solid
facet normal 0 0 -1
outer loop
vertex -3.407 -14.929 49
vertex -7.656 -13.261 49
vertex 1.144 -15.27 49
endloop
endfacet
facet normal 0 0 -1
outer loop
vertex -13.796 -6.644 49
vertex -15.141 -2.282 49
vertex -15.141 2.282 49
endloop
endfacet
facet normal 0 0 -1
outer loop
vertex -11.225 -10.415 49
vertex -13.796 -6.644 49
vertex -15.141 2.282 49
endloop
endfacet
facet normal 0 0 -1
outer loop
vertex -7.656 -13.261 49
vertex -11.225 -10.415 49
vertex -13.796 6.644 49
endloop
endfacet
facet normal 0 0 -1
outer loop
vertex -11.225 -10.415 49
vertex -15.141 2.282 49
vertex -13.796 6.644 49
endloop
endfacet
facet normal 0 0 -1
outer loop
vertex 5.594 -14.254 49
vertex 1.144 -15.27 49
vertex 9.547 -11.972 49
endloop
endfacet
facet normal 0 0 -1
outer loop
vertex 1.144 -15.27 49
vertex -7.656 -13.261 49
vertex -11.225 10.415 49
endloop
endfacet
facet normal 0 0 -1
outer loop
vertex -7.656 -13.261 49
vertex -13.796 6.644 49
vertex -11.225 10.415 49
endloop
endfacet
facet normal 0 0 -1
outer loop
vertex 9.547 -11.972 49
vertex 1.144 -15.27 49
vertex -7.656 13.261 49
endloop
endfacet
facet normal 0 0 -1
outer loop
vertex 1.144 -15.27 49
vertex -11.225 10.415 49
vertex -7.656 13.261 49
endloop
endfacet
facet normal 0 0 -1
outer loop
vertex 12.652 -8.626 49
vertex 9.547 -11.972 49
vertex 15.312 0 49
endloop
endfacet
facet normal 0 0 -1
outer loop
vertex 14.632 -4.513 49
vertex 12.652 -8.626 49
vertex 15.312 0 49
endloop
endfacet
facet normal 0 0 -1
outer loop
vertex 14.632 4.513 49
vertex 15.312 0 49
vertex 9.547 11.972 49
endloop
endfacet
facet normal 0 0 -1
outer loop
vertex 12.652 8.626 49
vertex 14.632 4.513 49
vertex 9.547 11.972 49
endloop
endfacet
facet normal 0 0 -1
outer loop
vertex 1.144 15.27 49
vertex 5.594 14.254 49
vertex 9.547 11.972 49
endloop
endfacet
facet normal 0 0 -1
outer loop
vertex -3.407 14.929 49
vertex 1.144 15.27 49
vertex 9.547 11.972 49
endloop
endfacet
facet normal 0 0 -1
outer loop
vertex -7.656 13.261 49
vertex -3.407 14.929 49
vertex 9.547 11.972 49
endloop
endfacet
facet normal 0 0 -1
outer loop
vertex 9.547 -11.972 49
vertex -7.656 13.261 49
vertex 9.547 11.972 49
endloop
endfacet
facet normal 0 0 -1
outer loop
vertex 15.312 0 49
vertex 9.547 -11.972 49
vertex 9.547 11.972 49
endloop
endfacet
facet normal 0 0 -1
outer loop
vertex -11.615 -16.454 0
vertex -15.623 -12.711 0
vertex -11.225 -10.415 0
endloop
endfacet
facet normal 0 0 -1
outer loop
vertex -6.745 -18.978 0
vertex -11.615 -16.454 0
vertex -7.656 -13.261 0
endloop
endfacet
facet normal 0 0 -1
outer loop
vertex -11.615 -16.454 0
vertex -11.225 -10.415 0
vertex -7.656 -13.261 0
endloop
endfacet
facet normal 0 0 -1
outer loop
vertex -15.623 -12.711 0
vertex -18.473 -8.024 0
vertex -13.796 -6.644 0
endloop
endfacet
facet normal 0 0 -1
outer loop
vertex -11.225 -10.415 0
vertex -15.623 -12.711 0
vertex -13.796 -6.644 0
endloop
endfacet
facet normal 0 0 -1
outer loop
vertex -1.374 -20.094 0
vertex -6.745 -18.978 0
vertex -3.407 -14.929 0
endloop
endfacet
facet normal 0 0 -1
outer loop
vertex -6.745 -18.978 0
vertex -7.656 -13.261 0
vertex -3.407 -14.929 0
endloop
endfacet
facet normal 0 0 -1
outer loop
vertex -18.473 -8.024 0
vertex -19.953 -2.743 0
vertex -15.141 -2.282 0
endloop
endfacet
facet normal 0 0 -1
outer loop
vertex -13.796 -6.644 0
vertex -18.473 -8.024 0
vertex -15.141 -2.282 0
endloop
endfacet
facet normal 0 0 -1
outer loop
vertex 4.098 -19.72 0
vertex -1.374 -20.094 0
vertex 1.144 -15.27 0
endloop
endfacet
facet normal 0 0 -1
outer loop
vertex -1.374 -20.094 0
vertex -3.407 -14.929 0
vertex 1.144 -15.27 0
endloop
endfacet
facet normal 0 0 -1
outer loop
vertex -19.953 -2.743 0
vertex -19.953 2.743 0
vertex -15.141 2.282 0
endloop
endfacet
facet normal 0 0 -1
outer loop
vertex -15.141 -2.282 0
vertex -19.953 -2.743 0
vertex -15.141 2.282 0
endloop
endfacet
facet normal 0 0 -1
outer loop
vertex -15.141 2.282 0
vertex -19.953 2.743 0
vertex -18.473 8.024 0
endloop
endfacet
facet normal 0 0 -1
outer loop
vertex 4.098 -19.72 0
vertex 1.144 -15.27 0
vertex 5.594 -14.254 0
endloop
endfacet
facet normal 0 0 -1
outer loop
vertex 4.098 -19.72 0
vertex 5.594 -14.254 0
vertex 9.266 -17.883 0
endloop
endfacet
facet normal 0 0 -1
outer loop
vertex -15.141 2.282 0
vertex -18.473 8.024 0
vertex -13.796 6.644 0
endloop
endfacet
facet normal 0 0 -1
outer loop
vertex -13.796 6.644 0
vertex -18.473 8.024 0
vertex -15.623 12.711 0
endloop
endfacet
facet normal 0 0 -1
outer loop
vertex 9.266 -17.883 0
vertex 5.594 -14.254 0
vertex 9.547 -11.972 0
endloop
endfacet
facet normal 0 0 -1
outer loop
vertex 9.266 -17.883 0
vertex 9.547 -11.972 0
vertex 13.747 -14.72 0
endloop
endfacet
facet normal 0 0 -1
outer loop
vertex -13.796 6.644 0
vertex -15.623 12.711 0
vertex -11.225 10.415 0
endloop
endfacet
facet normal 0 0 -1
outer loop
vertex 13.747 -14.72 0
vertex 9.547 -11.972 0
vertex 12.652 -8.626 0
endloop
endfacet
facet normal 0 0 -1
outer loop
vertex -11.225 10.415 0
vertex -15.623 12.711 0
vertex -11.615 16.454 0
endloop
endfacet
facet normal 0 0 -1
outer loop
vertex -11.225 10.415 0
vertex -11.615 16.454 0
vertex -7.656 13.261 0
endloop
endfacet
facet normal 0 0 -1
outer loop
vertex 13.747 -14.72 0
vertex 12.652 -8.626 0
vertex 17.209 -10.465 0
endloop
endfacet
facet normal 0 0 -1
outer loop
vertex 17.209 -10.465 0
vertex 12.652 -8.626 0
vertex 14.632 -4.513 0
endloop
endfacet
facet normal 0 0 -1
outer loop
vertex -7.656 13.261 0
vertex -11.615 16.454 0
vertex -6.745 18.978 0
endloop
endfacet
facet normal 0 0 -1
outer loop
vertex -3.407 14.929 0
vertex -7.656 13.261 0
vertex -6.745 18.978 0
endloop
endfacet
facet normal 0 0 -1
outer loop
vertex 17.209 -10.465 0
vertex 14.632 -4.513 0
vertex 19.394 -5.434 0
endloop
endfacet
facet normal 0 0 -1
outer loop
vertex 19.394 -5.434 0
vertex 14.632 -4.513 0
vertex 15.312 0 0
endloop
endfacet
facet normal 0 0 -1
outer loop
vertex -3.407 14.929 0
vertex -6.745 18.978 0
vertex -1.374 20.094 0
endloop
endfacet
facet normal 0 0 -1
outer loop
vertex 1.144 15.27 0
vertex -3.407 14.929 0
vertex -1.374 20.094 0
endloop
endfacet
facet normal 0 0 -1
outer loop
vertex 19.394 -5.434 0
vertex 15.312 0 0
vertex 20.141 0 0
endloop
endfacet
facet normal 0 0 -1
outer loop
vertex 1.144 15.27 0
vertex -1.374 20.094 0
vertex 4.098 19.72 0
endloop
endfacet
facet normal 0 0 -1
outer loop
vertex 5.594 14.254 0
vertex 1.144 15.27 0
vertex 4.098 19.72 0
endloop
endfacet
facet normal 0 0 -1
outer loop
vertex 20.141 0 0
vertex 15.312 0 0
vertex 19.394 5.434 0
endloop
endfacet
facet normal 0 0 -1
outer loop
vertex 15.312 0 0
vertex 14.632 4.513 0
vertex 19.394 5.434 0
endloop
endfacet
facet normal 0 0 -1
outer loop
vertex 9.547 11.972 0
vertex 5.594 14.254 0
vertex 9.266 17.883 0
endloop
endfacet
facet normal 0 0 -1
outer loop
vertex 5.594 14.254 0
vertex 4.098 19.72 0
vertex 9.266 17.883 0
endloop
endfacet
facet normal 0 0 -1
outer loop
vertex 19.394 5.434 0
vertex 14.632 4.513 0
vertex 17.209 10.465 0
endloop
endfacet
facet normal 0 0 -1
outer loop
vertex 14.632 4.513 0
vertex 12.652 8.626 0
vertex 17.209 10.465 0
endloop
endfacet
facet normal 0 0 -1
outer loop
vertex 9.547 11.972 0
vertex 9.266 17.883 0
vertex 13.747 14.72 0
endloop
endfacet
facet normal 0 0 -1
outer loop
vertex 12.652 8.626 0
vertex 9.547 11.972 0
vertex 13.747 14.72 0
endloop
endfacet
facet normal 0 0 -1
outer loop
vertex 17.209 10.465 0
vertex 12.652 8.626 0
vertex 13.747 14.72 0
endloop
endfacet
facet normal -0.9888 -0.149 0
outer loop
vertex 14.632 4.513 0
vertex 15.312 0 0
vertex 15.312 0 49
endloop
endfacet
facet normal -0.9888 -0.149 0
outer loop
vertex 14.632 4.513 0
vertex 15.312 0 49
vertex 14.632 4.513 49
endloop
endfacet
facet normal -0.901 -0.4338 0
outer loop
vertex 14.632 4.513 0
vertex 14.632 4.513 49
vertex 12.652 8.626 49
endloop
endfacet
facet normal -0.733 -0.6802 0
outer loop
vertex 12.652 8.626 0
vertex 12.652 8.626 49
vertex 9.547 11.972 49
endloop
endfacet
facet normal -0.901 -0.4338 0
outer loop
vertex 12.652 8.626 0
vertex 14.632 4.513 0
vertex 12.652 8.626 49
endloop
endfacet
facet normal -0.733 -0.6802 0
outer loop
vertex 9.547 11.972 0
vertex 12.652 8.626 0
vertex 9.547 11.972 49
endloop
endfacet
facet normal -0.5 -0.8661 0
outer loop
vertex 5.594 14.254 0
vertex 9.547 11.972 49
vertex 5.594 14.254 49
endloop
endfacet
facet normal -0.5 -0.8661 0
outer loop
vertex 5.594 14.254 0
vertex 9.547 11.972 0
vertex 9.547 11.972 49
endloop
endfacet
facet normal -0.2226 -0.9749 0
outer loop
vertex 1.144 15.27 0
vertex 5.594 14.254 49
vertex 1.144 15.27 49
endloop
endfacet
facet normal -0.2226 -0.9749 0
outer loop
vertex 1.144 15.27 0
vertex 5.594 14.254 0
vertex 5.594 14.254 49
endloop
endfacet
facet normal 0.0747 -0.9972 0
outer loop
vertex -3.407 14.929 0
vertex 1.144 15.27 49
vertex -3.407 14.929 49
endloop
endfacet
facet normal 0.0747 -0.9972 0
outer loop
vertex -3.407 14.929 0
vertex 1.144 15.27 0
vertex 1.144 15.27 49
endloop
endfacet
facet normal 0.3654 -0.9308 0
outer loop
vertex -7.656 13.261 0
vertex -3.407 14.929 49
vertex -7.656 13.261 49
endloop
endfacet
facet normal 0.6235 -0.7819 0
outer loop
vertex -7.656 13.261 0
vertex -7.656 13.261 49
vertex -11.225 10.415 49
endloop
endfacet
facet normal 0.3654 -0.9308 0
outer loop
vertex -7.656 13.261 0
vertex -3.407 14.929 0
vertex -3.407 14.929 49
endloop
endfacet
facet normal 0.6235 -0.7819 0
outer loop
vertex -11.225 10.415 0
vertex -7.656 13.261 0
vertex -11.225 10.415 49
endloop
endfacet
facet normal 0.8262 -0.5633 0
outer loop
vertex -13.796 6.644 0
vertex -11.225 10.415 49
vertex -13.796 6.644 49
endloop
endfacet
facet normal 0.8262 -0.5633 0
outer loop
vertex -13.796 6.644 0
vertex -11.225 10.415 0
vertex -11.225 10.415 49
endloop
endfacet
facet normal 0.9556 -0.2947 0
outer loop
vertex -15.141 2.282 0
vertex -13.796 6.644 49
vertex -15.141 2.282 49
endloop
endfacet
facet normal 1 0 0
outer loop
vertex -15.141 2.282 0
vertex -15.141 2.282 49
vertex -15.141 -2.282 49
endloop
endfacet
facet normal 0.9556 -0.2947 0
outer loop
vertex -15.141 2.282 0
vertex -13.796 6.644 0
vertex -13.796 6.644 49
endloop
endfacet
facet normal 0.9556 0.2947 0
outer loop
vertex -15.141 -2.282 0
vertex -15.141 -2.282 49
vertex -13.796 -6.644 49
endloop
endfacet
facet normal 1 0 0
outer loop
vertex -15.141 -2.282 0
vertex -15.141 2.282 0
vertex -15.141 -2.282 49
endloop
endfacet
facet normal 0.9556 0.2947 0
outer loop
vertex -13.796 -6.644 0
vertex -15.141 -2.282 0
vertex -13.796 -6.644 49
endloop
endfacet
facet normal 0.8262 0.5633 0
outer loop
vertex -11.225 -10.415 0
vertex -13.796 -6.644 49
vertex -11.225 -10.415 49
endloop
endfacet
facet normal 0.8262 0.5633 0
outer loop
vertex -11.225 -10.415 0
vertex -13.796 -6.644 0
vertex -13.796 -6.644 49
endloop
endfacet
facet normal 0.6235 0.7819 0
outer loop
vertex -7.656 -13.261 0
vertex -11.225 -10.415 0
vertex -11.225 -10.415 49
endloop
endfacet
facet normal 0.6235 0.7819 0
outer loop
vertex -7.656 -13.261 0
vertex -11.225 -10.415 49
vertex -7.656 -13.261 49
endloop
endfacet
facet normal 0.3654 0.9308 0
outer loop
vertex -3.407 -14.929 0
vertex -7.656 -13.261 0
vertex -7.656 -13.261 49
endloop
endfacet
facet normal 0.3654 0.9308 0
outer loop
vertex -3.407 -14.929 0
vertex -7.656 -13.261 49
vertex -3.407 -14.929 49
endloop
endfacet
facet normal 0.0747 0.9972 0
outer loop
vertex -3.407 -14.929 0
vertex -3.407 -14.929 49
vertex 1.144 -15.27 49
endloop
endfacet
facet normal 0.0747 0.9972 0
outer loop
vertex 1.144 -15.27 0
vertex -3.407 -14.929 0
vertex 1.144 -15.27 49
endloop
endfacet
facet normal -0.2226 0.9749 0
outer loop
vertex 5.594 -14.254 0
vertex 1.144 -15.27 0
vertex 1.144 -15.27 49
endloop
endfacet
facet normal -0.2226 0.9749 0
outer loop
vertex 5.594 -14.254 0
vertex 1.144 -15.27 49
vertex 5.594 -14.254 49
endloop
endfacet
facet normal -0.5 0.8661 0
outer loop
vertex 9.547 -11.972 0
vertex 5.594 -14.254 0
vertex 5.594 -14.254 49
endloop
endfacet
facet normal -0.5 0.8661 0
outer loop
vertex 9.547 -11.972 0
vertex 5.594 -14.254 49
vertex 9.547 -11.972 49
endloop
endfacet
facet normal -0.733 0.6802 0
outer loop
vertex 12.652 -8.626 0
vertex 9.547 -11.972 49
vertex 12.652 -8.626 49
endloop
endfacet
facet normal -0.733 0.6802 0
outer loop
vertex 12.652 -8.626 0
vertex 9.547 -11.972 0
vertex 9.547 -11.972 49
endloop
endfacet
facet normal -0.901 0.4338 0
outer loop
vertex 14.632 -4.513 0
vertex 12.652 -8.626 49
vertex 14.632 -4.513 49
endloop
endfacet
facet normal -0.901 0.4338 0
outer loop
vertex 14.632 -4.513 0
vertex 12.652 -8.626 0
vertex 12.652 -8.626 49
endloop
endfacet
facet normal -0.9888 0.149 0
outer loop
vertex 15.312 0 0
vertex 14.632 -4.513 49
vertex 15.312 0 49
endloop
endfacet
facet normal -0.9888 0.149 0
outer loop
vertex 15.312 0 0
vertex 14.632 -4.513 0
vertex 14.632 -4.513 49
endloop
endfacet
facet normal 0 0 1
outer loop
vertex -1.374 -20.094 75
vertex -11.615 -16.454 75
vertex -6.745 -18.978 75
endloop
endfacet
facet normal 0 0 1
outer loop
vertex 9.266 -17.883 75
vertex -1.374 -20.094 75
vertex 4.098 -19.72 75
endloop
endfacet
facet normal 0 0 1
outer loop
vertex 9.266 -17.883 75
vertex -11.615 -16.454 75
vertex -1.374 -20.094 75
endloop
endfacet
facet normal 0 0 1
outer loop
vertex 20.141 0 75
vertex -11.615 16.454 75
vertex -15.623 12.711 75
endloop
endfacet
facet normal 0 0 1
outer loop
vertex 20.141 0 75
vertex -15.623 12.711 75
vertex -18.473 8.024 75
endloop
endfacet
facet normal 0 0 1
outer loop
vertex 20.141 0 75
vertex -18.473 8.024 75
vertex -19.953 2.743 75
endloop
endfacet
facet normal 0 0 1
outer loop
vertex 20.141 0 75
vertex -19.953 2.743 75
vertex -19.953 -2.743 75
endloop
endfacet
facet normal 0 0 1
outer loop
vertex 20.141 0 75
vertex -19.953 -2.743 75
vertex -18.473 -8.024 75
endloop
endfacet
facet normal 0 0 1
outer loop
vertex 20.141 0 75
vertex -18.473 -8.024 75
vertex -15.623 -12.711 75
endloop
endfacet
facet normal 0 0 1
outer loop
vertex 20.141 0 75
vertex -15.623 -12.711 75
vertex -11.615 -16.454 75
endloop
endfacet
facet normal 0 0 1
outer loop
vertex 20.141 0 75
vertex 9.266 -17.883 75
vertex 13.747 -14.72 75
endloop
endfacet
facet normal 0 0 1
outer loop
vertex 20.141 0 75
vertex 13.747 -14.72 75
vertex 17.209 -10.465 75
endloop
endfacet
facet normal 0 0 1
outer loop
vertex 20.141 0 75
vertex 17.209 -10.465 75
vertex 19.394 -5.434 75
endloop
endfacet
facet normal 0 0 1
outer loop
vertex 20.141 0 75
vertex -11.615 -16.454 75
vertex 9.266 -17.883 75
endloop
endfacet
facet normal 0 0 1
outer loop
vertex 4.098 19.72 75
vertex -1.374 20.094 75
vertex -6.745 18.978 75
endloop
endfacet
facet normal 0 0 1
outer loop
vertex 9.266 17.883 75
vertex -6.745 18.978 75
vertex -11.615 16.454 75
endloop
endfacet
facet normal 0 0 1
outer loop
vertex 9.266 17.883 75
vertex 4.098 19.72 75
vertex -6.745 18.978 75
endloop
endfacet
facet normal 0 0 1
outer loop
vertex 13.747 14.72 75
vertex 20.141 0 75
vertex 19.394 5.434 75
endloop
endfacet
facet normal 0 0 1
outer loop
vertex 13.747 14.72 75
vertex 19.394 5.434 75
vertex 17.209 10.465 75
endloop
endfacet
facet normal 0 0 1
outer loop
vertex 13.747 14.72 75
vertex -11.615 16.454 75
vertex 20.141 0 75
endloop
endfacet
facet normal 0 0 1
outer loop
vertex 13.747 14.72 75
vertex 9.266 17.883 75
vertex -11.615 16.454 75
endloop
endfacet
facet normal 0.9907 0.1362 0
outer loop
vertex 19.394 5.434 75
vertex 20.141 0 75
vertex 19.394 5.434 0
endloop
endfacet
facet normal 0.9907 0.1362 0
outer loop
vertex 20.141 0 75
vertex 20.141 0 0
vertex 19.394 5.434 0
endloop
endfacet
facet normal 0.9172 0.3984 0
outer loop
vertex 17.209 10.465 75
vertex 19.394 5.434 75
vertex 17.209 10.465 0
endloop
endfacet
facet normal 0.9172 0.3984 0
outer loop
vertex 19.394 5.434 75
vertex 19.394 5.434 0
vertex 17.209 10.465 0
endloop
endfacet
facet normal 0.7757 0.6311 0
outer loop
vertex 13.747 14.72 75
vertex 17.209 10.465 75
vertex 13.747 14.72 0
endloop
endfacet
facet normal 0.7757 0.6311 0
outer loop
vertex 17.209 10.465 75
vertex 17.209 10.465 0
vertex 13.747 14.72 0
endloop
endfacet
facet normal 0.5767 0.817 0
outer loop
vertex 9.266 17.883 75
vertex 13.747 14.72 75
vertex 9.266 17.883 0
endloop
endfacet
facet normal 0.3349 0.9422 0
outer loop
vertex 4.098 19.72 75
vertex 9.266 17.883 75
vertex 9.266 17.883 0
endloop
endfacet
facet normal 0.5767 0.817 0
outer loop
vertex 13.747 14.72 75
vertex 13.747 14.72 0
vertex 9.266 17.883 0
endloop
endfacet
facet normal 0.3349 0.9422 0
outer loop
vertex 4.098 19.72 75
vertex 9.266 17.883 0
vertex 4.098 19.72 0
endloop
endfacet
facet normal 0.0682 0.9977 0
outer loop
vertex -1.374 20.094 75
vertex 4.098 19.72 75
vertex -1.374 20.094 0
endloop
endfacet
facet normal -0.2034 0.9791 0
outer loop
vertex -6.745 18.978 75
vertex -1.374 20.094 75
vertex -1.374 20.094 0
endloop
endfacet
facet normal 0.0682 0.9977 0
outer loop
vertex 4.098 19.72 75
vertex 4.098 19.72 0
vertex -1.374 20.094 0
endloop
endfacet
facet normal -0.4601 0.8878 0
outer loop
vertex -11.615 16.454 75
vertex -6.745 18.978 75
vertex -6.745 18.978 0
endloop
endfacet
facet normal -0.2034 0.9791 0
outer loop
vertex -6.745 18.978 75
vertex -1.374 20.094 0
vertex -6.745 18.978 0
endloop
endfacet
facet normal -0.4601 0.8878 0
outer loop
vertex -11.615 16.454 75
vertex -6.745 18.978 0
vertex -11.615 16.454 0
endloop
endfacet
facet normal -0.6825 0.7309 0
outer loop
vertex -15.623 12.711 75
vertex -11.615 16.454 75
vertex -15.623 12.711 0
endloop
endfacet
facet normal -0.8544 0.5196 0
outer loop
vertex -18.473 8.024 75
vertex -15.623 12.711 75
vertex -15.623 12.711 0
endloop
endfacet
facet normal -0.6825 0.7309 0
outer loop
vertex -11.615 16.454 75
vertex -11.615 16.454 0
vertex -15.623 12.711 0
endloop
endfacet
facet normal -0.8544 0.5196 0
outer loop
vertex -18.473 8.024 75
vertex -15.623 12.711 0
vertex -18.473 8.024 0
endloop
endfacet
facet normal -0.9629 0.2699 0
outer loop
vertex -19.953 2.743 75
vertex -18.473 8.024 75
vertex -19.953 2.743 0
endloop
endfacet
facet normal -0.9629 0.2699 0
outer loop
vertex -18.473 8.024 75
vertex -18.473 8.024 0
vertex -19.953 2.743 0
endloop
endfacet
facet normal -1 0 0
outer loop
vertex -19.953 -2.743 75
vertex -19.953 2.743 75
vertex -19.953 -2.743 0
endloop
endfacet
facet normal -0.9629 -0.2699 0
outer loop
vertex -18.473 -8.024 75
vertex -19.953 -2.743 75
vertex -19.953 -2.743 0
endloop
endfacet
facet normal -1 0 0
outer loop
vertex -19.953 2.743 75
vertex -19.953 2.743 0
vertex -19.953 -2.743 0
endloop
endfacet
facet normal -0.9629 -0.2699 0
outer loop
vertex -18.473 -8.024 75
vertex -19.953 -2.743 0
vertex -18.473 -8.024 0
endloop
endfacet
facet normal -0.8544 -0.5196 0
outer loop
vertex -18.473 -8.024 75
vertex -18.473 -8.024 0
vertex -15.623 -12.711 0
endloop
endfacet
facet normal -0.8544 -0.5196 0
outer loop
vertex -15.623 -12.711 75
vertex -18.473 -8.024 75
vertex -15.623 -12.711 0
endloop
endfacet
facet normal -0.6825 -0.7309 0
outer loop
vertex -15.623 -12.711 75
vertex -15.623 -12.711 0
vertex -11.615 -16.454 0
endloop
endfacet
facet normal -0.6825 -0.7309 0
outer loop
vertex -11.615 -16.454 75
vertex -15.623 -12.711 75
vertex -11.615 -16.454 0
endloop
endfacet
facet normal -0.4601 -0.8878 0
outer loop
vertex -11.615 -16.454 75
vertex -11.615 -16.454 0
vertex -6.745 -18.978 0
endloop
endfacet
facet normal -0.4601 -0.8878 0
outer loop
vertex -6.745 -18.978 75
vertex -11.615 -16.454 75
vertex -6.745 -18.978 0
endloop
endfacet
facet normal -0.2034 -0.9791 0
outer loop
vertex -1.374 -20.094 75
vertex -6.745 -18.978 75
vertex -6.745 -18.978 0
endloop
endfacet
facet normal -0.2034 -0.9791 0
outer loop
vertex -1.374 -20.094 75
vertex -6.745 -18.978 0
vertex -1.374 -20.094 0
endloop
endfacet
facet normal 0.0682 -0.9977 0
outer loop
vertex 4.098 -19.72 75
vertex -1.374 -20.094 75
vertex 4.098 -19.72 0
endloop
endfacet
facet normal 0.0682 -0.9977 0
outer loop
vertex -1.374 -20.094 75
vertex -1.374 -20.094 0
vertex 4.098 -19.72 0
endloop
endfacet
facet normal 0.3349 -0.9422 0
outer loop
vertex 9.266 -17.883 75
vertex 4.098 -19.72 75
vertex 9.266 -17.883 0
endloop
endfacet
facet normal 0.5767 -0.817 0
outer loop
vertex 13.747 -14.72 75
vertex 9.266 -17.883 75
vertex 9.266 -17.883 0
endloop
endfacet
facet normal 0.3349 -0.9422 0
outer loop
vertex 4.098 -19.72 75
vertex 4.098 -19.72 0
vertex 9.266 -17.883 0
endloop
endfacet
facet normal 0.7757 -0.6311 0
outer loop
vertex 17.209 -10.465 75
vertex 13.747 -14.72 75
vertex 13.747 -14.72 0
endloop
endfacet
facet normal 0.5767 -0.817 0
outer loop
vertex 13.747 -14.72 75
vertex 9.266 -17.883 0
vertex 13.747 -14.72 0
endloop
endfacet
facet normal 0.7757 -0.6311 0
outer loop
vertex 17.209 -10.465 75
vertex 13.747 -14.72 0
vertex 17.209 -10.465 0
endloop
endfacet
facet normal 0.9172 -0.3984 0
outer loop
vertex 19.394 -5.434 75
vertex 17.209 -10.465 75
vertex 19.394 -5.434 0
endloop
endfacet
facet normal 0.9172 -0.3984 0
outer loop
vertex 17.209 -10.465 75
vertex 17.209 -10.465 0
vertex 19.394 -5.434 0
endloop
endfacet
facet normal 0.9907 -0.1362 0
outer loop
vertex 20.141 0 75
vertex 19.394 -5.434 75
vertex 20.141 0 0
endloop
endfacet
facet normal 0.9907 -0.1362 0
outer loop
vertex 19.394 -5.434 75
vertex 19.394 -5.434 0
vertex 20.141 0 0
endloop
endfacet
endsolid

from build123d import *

# Parameters (mm, degrees)
F0_R      = 20.140817
F1_DEPTH  = 50
F2_R      = 15.312495
F3_DEPTH  = 49
F1_FACE_R = 20.140817
F4_DEPTH  = 25


with BuildPart() as f1:
    # F0 (on Top) → F1 (new body)
    with BuildSketch(Plane.XY):
        Circle(F0_R)
    extrude(amount=F1_DEPTH)

    # F2 (on Top) → F3 (cut)
    with BuildSketch(Plane.XY):
        Circle(F2_R)
    extrude(amount=F3_DEPTH, mode=Mode.SUBTRACT)

    # F1_face (on face) → F4 (join)
    with BuildSketch(Plane.XY.offset(50)):
        Circle(F1_FACE_R)
    extrude(amount=F4_DEPTH)


solid = f1.part
